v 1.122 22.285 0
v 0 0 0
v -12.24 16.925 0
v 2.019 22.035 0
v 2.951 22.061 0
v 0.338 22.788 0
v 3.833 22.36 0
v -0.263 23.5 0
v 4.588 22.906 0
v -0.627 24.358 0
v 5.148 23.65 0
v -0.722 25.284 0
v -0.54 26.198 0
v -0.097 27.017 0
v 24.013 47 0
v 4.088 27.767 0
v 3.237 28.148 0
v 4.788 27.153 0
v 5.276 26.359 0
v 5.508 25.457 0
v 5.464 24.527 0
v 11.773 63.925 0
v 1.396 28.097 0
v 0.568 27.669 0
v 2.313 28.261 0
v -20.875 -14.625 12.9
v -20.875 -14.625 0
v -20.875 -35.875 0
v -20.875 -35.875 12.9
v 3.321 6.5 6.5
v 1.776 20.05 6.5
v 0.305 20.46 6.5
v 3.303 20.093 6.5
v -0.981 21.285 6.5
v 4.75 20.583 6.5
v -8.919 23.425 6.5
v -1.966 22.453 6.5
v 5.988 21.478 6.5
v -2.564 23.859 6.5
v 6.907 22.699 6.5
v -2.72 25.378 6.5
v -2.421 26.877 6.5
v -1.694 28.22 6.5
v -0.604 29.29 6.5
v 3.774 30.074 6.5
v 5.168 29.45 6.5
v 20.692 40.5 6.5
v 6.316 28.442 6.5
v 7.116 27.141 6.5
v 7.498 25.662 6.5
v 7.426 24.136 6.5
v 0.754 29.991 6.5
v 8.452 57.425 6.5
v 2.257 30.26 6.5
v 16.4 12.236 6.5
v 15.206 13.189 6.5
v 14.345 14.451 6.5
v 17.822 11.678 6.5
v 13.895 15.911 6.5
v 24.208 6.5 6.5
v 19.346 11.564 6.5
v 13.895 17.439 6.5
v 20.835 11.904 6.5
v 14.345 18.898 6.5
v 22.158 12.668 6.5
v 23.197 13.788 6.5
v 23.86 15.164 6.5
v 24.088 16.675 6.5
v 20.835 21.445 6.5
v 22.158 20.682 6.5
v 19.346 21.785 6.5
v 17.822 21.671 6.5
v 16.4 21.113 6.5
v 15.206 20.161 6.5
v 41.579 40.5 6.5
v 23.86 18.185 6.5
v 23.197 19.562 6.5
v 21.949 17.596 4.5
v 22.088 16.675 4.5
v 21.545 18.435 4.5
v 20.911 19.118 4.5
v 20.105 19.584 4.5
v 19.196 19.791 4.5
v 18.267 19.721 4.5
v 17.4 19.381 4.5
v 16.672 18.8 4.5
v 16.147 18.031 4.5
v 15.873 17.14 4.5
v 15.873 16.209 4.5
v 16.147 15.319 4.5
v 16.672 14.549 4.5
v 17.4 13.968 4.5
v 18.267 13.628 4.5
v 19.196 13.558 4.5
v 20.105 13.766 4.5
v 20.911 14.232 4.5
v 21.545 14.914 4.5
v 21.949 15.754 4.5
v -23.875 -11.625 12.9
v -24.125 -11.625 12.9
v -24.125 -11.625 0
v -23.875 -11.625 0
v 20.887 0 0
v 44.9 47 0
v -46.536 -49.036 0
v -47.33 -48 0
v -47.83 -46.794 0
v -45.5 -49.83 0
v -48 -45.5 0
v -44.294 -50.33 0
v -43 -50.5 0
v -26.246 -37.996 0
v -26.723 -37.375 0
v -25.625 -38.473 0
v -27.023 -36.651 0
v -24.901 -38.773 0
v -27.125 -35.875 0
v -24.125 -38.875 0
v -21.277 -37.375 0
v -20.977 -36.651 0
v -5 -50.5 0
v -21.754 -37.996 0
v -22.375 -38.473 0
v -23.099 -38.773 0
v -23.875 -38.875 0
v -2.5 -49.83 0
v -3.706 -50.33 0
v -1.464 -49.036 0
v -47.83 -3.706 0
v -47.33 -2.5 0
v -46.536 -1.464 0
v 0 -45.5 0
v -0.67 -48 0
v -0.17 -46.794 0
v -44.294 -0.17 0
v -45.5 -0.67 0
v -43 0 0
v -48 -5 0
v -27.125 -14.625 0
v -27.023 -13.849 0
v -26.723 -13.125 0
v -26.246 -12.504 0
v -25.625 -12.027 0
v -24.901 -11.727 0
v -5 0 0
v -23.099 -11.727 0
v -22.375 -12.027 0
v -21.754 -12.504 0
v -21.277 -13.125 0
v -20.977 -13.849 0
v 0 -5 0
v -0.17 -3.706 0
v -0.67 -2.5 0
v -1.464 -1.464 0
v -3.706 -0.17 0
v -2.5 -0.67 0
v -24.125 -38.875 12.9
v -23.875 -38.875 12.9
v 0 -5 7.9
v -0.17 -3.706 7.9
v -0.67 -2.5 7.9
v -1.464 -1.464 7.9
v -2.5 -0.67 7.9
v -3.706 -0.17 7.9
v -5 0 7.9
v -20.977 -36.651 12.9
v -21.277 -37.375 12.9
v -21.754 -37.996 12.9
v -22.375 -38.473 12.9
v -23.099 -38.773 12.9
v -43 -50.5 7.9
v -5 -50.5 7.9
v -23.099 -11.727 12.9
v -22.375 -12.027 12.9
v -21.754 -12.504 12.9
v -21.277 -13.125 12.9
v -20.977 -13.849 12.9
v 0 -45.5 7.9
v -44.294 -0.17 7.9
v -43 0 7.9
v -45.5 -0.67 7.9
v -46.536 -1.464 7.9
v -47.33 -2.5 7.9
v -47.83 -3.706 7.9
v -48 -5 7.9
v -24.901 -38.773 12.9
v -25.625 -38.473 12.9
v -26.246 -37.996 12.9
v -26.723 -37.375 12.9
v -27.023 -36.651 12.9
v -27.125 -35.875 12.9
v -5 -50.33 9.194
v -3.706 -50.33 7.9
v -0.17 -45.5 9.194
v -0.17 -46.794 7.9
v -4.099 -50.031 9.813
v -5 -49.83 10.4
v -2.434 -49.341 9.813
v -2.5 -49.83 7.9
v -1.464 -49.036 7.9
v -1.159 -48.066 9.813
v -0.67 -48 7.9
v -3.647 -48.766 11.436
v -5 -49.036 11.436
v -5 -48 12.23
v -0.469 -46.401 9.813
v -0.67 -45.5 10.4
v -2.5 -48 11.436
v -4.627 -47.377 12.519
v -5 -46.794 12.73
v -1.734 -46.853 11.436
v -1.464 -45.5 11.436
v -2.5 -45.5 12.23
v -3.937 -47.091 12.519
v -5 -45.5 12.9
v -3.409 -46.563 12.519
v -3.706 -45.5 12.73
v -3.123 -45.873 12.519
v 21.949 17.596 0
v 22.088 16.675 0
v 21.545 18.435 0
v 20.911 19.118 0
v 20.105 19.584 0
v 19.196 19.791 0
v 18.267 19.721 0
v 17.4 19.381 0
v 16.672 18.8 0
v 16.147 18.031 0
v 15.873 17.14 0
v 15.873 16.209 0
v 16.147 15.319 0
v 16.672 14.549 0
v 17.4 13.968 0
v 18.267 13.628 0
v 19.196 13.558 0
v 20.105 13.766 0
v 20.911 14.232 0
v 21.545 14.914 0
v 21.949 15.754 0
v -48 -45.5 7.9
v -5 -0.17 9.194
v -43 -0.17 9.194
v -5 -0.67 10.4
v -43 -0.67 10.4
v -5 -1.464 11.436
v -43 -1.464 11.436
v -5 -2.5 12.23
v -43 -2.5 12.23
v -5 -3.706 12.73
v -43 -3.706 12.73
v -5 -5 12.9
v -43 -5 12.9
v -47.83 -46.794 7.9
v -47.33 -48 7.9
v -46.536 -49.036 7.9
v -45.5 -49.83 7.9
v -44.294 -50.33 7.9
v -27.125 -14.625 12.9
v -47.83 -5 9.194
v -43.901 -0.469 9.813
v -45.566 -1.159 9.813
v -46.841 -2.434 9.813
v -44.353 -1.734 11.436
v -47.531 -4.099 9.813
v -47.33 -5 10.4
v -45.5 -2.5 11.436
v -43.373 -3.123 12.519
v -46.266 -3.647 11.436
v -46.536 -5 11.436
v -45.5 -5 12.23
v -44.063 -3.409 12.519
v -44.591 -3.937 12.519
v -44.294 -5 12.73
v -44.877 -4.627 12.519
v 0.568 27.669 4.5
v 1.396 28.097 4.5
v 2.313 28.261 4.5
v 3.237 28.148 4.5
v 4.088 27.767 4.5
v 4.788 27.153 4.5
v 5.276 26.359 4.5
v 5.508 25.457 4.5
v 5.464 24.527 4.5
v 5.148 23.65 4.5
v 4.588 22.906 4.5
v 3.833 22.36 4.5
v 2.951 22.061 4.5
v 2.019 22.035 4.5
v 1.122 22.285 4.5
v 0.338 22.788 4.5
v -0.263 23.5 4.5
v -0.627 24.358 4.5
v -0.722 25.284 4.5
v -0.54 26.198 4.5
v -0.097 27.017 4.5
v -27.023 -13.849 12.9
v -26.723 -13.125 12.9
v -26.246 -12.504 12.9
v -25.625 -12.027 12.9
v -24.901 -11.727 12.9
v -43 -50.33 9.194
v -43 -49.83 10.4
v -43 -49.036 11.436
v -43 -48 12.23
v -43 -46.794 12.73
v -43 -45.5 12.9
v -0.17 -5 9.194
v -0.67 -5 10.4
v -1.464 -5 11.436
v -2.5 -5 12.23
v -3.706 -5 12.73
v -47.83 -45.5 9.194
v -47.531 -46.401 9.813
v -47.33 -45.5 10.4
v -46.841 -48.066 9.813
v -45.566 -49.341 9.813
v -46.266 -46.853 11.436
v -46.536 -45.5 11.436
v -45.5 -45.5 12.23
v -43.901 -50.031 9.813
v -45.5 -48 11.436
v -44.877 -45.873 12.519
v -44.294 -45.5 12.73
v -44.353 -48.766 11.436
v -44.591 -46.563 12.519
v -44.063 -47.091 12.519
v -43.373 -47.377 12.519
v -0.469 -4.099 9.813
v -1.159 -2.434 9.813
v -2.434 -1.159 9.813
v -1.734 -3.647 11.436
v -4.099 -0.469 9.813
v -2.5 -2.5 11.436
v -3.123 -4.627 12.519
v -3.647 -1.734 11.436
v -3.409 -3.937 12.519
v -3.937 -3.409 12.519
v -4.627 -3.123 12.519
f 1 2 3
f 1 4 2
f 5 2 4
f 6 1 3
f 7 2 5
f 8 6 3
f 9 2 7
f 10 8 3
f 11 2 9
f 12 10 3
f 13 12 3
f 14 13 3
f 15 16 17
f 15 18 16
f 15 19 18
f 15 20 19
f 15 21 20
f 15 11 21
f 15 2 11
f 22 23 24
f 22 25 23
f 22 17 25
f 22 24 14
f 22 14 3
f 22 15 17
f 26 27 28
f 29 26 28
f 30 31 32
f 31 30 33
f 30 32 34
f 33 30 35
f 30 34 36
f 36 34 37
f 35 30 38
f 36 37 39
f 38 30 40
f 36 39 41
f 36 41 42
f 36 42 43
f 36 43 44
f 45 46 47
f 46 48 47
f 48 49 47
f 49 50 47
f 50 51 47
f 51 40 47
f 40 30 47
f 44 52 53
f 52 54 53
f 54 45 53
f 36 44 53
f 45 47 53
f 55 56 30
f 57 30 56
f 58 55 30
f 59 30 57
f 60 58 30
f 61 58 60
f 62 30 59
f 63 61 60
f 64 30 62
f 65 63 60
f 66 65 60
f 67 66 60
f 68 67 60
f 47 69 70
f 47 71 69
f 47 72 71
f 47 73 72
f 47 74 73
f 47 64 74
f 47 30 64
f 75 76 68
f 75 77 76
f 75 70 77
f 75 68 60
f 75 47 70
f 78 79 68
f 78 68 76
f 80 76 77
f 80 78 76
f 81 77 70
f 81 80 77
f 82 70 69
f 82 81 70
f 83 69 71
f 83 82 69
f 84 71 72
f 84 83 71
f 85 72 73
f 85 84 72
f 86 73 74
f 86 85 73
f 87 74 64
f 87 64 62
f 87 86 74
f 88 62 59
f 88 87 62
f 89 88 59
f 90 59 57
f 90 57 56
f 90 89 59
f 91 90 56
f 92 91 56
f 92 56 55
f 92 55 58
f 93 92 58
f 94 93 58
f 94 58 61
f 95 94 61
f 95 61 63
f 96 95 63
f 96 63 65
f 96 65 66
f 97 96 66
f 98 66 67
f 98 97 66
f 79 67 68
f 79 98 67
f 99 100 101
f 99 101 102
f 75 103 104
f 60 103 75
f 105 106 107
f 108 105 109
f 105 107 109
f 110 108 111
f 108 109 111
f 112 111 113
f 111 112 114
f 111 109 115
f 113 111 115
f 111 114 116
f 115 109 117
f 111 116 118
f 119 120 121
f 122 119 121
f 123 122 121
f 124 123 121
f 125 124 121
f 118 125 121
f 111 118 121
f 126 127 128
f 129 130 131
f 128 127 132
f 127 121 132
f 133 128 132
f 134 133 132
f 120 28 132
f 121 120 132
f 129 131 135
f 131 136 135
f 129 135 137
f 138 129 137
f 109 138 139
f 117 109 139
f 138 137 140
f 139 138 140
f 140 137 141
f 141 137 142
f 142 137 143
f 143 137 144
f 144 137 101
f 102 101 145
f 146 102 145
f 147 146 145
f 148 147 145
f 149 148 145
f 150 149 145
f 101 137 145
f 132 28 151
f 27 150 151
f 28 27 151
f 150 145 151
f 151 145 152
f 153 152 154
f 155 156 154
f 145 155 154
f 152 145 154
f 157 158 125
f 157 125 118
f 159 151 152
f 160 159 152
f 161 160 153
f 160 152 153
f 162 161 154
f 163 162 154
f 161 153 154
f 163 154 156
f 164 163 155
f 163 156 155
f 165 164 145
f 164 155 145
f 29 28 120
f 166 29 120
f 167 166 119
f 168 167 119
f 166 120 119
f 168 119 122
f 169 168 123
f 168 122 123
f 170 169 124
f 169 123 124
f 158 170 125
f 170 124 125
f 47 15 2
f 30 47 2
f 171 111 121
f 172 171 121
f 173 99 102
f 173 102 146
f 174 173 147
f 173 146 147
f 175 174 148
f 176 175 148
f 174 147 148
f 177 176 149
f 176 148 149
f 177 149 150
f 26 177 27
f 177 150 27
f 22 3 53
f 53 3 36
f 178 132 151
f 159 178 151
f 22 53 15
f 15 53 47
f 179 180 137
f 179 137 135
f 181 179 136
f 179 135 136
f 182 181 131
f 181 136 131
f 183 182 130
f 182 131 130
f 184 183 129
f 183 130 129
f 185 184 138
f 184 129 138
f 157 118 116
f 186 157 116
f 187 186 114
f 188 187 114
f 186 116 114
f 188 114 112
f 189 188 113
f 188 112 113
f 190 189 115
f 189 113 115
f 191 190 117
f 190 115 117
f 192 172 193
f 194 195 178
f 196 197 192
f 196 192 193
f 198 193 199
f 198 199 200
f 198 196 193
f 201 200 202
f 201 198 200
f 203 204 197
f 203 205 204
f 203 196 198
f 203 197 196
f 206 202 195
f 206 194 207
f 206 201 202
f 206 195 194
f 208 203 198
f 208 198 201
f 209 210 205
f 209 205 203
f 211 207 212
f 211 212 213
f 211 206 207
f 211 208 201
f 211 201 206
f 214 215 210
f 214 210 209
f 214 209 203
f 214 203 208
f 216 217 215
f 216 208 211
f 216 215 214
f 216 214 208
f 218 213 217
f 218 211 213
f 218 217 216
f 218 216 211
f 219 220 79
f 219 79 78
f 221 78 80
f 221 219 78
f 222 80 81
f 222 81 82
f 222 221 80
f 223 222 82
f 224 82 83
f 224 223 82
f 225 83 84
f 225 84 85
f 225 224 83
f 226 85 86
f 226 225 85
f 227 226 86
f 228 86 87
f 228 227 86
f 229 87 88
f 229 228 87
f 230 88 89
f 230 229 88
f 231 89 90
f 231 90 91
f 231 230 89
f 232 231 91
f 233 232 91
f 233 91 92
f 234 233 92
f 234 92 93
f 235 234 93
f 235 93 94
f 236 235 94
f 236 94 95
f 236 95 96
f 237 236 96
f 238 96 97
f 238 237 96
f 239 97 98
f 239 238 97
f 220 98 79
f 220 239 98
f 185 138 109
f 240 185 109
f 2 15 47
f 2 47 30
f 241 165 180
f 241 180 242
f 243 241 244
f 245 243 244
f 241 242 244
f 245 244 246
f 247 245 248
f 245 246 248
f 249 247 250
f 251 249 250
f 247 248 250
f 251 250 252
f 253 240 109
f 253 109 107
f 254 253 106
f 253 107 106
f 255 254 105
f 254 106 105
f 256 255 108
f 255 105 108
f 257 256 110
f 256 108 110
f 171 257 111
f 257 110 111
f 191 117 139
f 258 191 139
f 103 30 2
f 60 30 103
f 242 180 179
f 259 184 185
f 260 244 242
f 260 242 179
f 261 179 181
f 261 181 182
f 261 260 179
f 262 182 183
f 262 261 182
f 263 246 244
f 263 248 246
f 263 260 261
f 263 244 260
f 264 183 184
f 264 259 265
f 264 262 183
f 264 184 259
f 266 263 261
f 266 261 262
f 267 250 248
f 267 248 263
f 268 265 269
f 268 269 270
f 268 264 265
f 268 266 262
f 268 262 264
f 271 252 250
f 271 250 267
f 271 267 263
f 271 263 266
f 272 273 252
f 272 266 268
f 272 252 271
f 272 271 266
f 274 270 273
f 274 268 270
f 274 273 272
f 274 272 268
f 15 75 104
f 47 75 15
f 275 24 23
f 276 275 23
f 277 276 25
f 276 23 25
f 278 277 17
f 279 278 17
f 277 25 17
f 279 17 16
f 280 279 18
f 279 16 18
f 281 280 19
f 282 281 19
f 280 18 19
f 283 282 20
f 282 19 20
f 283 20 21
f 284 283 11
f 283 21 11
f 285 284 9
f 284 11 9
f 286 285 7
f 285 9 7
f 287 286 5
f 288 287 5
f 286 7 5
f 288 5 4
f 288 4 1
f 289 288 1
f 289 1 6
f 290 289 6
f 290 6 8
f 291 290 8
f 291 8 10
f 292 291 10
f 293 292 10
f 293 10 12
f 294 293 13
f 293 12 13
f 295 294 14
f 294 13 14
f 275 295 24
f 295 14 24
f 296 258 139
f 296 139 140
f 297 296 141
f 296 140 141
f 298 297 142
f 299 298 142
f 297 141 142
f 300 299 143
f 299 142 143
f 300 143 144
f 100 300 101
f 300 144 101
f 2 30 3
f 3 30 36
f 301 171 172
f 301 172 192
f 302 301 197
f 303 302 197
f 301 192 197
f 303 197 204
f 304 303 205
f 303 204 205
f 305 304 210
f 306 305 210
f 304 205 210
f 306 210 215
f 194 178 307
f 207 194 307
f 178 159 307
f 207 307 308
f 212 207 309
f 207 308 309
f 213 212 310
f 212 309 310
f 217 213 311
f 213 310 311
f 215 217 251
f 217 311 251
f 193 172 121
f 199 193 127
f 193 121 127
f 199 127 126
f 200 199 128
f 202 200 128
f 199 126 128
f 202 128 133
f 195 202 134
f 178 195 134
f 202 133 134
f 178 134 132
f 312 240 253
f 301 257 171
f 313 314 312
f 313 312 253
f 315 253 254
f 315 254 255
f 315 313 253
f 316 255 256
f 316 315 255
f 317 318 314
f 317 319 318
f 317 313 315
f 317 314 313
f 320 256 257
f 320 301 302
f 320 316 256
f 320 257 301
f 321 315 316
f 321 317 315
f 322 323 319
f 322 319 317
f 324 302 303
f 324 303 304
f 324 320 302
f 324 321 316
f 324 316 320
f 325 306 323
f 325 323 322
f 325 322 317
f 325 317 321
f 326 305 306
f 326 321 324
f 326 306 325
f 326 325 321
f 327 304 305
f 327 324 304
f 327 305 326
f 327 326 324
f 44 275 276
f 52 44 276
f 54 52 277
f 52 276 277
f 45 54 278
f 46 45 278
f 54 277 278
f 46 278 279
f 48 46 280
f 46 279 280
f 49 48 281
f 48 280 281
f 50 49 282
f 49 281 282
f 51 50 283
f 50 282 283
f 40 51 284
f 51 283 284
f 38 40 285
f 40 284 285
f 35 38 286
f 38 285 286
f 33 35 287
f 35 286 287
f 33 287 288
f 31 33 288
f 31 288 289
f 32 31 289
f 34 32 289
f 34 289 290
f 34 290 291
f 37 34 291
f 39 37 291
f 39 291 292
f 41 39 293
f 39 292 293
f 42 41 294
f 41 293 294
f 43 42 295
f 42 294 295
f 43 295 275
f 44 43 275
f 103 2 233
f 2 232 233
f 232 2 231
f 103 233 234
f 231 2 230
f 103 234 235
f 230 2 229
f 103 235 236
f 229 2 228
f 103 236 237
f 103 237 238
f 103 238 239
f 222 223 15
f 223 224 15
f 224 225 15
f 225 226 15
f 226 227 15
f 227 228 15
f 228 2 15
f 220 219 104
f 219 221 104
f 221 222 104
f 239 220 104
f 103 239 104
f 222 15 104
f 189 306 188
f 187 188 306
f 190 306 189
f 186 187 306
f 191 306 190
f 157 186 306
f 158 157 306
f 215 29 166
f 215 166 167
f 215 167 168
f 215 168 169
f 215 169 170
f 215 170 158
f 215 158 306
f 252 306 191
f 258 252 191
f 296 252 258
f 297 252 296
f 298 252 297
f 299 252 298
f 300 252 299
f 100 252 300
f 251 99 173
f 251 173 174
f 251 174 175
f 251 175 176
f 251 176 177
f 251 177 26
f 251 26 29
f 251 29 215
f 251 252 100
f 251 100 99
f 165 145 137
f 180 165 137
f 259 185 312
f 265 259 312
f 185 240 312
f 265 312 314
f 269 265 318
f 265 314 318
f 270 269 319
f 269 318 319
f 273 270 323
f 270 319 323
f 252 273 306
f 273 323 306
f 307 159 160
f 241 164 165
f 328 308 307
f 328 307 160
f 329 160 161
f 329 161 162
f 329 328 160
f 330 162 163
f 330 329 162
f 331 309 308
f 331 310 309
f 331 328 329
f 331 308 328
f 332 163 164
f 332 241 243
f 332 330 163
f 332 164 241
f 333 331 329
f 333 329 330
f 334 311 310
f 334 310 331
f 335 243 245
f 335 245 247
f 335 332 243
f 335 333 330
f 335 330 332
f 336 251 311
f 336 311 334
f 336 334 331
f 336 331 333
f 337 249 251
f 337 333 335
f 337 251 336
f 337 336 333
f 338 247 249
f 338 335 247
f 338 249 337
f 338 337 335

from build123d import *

# Parameters (mm, degrees)
F1_DEPTH = 12.9
F2_R     = 5
F3_R     = 3.125
F4_DEPTH = 6.5
F5_SIZE  = 6.49999
F6_SIZE  = 2


# Not quite as in the source:
# - a fillet or chamfer is up to 0.001 mm smaller than in the source, because OpenCascade refuses the exact size


with BuildPart() as f1:
    # F0 (on Top) → F1 (new body)
    with BuildSketch(Plane.XY):
        with BuildLine():
            ThreePointArc((-48, -45.5), (-46.5355339059, -49.0355339059), (-43, -50.5))
            Line((-43, -50.5), (-5, -50.5))
            ThreePointArc((-5, -50.5), (-1.4644660941, -49.0355339059), (0, -45.5))
            Line((0, -45.5), (0, -5))
            ThreePointArc((0, -5), (-1.4644660941, -1.4644660941), (-5, 0))
            Line((-5, 0), (-43, 0))
            ThreePointArc((-43, 0), (-46.5355339059, -1.4644660941), (-48, -5))
            Line((-48, -5), (-48, -45.5))
        make_face()
        with BuildLine():
            ThreePointArc((-27.125, -14.625), (-26.2463203436, -12.5036796564), (-24.125, -11.625))
            Line((-24.125, -11.625), (-23.875, -11.625))
            ThreePointArc((-23.875, -11.625), (-21.7536796564, -12.5036796564), (-20.875, -14.625))
            Line((-20.875, -14.625), (-20.875, -35.875))
            ThreePointArc((-20.875, -35.875), (-21.7536796564, -37.9963203436), (-23.875, -38.875))
            Line((-23.875, -38.875), (-24.125, -38.875))
            ThreePointArc((-24.125, -38.875), (-26.2463203436, -37.9963203436), (-27.125, -35.875))
            Line((-27.125, -35.875), (-27.125, -14.625))
        make_face(mode=Mode.SUBTRACT)
    extrude(amount=F1_DEPTH)

    # F2
    f2_edges = [f1.edges().sort_by_distance(p)[0] for p in [
        (0, -25.25, 12.9),
        (-1.464466, -49.035534, 12.9),
        (-24, -50.5, 12.9),
        (-46.535534, -49.035534, 12.9),
        (-48, -25.25, 12.9),
        (-46.535534, -1.464466, 12.9),
        (-24, 0, 12.9),
        (-1.464466, -1.464466, 12.9),
    ]]
    fillet(f2_edges, radius=F2_R)


with BuildPart() as f4:
    # F3 (on Top) → F4 (new body)
    with BuildSketch(Plane.XY):
        Polygon((24.0128942012, 47), (0, 0), (20.8869944401, 0), (44.8998886413, 47), align=None)
        with Locations((18.9628277648, 16.6747303447)):
            Circle(F3_R, mode=Mode.SUBTRACT)
    extrude(amount=F4_DEPTH)

    # F5 (size 6.5 in the source; OpenCascade refuses exactly that, so slightly less here)
    f5_edges = [f4.edges().sort_by_distance(p)[0] for p in [
        (10.443497, 0, 6.5),
        (34.456391, 47, 6.5),
    ]]
    chamfer(f5_edges, length=F5_SIZE)

    # F6
    f6_edges = [f4.edges().sort_by_distance(p)[0] for p in [
        (15.837828, 16.67473, 6.5),
    ]]
    chamfer(f6_edges, length=F6_SIZE)


with BuildPart() as f7_1:
    # F7: instance of F4
    add(f4.part.mirror(Plane(origin=(12.0064471006, 23.5, 3.0761317731), x_dir=(-0.4549709236, -0.8905062934, 0), z_dir=(-0.8905062934, 0.4549709236, 0))))


solid = Compound([f1.part, f4.part, f7_1.part])
